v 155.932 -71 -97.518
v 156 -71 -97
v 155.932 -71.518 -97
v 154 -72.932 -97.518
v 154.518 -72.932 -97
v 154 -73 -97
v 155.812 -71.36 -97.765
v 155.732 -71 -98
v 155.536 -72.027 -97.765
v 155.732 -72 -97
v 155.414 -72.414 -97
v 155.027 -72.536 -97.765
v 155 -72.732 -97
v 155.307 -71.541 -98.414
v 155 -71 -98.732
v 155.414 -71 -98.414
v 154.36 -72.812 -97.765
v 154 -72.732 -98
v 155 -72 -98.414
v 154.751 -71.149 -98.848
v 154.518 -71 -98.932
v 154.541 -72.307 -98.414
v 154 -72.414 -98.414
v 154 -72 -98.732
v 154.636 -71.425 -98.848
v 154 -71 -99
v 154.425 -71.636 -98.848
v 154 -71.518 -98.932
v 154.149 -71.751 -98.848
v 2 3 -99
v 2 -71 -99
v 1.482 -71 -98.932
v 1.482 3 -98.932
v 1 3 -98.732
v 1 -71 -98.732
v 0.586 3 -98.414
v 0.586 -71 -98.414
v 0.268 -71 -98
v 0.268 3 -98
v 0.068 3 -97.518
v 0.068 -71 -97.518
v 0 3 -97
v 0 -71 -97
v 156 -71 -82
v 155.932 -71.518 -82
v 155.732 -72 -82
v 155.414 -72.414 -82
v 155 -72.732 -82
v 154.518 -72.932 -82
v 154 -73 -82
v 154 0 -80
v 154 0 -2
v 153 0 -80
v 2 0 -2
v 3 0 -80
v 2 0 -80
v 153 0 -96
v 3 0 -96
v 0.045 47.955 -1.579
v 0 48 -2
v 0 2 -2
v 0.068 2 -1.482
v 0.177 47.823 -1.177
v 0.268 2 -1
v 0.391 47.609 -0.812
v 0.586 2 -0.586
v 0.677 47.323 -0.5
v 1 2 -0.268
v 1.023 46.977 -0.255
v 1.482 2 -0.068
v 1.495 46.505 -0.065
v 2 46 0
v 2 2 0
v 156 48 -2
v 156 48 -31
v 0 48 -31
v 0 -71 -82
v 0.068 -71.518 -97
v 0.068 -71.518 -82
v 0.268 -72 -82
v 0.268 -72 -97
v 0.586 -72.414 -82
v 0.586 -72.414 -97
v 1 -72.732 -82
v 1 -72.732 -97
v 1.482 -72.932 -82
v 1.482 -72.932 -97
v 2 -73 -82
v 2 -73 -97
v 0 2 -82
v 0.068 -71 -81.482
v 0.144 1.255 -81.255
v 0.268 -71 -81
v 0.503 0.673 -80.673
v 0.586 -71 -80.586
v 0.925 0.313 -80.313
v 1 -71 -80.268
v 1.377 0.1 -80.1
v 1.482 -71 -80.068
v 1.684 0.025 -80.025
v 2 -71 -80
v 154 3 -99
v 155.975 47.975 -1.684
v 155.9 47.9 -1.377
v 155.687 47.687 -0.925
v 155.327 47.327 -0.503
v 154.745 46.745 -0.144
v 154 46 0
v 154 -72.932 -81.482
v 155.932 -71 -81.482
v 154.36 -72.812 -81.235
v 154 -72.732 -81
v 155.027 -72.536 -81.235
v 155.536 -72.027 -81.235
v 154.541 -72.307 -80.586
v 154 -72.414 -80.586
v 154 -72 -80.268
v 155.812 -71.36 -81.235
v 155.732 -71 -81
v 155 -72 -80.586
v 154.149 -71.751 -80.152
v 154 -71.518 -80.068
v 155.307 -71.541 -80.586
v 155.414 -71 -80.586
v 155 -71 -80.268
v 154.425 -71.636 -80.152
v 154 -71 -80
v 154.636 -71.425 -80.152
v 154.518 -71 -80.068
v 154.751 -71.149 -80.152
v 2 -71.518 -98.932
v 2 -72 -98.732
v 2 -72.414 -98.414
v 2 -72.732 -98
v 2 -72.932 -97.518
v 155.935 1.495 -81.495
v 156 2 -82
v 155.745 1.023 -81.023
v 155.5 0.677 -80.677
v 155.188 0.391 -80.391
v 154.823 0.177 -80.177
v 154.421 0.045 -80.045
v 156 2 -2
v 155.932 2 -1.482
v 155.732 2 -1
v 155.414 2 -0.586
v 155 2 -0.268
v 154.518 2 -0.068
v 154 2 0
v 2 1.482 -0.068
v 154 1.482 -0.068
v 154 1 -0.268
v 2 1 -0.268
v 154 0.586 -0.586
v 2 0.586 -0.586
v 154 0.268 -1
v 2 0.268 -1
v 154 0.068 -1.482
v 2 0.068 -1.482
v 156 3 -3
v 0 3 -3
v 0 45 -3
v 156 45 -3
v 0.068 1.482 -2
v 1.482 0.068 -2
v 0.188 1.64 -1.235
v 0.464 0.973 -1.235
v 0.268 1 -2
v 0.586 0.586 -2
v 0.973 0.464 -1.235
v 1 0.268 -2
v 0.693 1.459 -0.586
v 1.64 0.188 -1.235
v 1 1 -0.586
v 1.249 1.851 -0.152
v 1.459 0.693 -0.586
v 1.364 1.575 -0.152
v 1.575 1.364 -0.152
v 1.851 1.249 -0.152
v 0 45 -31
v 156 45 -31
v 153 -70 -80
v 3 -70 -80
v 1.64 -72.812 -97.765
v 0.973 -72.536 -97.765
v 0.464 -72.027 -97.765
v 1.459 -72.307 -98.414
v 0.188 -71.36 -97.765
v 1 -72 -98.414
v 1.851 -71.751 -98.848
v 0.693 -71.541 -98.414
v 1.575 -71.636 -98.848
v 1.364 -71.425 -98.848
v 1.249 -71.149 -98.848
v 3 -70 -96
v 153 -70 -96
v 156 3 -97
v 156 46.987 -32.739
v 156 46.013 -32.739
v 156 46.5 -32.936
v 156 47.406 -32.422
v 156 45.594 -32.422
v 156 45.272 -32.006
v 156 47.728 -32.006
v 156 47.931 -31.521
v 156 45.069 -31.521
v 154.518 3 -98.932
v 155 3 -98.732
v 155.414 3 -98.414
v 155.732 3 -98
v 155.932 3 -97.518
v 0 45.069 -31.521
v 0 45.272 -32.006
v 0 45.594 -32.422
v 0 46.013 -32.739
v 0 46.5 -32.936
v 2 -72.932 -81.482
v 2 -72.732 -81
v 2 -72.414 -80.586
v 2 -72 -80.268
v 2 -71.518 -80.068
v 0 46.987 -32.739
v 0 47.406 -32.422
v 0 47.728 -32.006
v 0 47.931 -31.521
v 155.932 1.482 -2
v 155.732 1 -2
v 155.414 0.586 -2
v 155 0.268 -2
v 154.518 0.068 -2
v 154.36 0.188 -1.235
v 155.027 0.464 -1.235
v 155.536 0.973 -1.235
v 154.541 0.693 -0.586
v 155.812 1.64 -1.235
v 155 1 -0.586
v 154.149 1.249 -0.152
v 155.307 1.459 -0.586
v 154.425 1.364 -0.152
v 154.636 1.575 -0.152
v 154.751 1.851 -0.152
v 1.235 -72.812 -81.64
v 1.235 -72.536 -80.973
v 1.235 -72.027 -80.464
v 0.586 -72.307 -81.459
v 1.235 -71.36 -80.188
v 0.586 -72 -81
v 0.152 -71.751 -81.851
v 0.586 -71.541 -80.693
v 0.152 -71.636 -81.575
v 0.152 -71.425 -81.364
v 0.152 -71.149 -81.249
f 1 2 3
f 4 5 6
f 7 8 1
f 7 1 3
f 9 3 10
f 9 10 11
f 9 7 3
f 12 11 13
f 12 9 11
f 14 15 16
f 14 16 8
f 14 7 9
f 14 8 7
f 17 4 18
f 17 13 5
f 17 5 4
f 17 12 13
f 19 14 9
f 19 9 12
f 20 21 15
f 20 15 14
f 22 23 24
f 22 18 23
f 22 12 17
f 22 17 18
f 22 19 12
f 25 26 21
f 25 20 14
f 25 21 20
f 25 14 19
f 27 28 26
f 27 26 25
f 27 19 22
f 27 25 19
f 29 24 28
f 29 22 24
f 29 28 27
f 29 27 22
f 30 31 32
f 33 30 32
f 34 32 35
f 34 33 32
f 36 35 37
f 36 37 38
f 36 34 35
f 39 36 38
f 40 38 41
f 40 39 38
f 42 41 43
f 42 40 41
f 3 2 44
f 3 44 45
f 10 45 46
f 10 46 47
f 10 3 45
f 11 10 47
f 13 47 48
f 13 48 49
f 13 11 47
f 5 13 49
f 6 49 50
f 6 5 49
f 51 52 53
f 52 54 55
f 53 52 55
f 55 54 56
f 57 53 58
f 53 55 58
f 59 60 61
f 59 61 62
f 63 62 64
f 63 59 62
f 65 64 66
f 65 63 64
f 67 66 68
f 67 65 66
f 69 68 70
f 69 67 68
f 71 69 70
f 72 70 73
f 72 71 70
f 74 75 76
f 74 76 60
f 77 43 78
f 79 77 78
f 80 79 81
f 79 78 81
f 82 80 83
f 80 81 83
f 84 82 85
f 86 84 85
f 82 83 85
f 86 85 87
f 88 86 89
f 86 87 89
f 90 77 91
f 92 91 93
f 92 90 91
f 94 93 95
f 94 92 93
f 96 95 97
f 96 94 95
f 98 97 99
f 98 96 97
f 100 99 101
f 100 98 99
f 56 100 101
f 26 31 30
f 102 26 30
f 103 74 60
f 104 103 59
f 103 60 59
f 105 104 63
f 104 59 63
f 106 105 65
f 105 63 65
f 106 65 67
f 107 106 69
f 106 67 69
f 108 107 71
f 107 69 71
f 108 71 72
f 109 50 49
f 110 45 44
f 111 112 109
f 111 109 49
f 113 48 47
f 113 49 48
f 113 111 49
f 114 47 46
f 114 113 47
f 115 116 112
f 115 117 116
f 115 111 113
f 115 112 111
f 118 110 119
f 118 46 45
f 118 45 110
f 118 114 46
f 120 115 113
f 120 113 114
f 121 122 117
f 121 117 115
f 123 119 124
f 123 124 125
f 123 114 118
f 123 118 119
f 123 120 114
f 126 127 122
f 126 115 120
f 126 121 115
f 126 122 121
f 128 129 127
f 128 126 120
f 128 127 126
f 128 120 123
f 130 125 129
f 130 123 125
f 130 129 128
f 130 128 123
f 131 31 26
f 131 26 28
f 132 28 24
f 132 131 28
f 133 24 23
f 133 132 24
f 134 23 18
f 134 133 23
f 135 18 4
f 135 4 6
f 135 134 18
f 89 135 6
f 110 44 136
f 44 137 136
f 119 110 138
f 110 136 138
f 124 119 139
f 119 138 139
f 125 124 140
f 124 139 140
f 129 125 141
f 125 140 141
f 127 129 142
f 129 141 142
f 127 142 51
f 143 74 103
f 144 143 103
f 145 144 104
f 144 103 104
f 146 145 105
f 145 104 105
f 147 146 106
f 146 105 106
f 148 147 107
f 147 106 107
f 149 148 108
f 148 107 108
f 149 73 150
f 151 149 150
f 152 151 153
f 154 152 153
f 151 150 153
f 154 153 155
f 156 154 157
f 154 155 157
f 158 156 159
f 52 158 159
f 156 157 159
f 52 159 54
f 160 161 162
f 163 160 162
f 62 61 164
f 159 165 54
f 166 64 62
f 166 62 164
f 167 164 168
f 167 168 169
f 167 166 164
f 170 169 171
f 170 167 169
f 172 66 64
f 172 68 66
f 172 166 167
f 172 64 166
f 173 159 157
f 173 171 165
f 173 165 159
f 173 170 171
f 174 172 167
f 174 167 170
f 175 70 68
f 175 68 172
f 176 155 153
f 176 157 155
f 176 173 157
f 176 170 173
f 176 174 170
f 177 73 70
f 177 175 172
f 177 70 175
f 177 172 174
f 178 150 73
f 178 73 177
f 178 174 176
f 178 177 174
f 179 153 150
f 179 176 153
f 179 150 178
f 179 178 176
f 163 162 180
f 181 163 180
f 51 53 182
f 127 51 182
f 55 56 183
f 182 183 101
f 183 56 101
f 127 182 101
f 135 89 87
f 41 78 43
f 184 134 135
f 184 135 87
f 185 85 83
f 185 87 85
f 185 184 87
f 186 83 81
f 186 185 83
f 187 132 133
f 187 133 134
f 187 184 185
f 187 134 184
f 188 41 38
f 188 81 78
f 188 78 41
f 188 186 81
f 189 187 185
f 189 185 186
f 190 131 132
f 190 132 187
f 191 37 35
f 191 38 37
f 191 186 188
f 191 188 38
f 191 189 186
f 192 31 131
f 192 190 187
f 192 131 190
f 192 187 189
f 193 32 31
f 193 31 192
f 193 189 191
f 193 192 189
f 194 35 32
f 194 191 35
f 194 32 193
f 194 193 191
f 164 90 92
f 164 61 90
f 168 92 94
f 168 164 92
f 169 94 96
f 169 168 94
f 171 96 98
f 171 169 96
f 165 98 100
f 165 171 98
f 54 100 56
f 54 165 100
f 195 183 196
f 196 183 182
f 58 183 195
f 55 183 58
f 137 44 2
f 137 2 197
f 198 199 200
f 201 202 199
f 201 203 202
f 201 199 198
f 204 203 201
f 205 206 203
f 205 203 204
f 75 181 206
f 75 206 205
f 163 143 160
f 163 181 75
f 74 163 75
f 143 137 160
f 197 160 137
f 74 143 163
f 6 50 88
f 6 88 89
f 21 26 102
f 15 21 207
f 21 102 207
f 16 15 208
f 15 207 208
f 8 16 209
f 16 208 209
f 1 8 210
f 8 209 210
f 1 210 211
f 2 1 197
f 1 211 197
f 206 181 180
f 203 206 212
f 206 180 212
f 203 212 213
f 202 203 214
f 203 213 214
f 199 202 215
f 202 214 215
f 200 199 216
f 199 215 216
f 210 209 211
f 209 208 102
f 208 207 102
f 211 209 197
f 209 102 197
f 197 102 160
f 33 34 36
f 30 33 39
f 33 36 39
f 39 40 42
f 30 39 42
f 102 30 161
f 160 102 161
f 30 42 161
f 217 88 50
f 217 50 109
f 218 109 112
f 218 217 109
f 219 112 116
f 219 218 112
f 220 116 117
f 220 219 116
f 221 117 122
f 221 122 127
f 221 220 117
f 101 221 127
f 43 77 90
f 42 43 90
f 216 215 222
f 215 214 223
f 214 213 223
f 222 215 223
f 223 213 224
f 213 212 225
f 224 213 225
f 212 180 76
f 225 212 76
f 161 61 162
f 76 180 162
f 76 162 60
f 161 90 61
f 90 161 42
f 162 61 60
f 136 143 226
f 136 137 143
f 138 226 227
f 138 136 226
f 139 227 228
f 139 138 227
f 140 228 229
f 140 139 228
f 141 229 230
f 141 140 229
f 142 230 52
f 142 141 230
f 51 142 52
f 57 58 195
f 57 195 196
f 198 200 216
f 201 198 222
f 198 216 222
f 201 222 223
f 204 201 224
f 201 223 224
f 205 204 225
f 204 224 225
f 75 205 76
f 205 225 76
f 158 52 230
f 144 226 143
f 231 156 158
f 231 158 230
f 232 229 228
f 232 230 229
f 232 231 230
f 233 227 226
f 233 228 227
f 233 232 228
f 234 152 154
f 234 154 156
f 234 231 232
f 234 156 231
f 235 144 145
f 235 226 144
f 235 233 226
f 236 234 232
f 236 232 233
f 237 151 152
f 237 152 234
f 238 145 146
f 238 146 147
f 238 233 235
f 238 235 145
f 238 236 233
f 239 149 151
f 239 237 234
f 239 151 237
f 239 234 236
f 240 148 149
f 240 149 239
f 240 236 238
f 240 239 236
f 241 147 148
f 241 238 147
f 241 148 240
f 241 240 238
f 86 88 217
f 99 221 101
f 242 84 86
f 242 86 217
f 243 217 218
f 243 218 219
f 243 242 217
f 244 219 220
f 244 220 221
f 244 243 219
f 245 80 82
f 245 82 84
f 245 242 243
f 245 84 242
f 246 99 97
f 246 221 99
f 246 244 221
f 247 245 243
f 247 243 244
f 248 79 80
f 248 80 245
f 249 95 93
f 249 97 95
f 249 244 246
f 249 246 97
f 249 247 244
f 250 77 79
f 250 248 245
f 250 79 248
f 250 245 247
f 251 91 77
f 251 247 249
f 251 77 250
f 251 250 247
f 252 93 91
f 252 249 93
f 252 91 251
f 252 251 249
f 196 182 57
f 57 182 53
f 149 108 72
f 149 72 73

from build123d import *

# Parameters (mm, degrees)
F1_DEPTH     = 156
F2_W         = 150
F2_H         = 70
F3_DEPTH     = 16
F4_T1_DEPTH  = 152
F4_T3_DEPTH  = 51
F4_T5_DEPTH  = 166
F4_T7_DEPTH  = 78
F4_T9_DEPTH  = 71
F4_T11_DEPTH = 79
F4_T13_DEPTH = 15
F4_S17_W     = 2
F4_S17_H     = 2
F4_T18_DEPTH = 2
F4_S23_W     = 2
F4_S23_H     = 2
F4_T24_DEPTH = 2
F4_S29_W     = 2
F4_S29_H     = 2
F4_T30_DEPTH = 2
F4_S35_W     = 2
F4_S35_H     = 2
F4_T36_DEPTH = 2
F4_S41_W     = 2
F4_S41_H     = 2
F4_T42_DEPTH = 2
F4_S47_W     = 2
F4_S47_H     = 2
F4_T48_DEPTH = 2
F4_T55_DEPTH = 83
F4_T59_DEPTH = 76
F4_T66_DEPTH = 83
F4_T70_DEPTH = 76


# Not quite as in the source:
# - a fillet or chamfer that OpenCascade refuses, or shapes differently, is made with other operations: its cross-section is extruded or revolved along the edge and cut away or added


with BuildPart() as f1:
    # F0 (on Right) → F1 (new body)
    with BuildSketch(Plane.YZ):
        Polygon((3, -99), (3, -3), (0, -3), (0, -80), (-73, -80), (-73, -99), align=None)
        Polygon((0, -3), (3, -3), (45, -3), (45, 0), (0, 0), align=None)
        Polygon((45, 0), (45, -3), (45, -33), (48, -33), (48, 0), align=None)
    extrude(amount=F1_DEPTH)

    # F2 (on face) → F3 (cut)
    with BuildSketch(Plane.XY.offset(-80)):
        with Locations((78, -35)):
            Rectangle(F2_W, F2_H)
    extrude(amount=-F3_DEPTH, mode=Mode.SUBTRACT)

    # F4: fillet of radius 2 on 16 edges, made by hand

    # F4_s2 → F4_t1 (cut)
    with BuildSketch(Plane.YZ.offset(2)):
        with BuildLine():
            ThreePointArc((2, 0), (0.5857864376, -0.5857864376), (0, -2))
            Line((0, -2), (0, 0))
            Line((0, 0), (2, 0))
        make_face()
        with BuildLine():
            ThreePointArc((-73, -82), (-72.4142135624, -80.5857864376), (-71, -80))
            Line((-71, -80), (-73, -80))
            Line((-73, -80), (-73, -82))
        make_face()
        with BuildLine():
            ThreePointArc((-71, -99), (-72.4142135624, -98.4142135624), (-73, -97))
            Line((-73, -97), (-73, -99))
            Line((-73, -99), (-71, -99))
        make_face()
    extrude(amount=F4_T1_DEPTH, mode=Mode.SUBTRACT)

    # F4_s4 → F4_t3 (cut)
    with BuildSketch(Plane.XZ.offset(-53)):
        with BuildLine():
            ThreePointArc((156, -2), (155.4142135624, -0.5857864376), (154, 0))
            Line((154, 0), (156, 0))
            Line((156, 0), (156, -2))
        make_face()
        with BuildLine():
            ThreePointArc((0, -2), (0.5857864376, -0.5857864376), (2, 0))
            Line((2, 0), (0, 0))
            Line((0, 0), (0, -2))
        make_face()
    extrude(amount=F4_T3_DEPTH, mode=Mode.SUBTRACT)

    # F4_s6 → F4_t5 (cut)
    with BuildSketch(Plane.YZ.offset(-5)):
        with BuildLine():
            ThreePointArc((48, -2), (47.4142135624, -0.5857864376), (46, 0))
            Line((46, 0), (48, 0))
            Line((48, 0), (48, -2))
        make_face()
        with BuildLine():
            ThreePointArc((46, -33), (47.4142135624, -32.4142135624), (48, -31))
            Line((48, -31), (48, -33))
            Line((48, -33), (46, -33))
        make_face()
        with BuildLine():
            ThreePointArc((45, -31), (45.5857864376, -32.4142135624), (47, -33))
            Line((47, -33), (45, -33))
            Line((45, -33), (45, -31))
        make_face()
    extrude(amount=F4_T5_DEPTH, mode=Mode.SUBTRACT)

    # F4_s8 → F4_t7 (cut)
    with BuildSketch(Plane.XY.offset(-80)):
        with BuildLine():
            ThreePointArc((156, 2), (155.4142135624, 0.5857864376), (154, 0))
            Line((154, 0), (156, 0))
            Line((156, 0), (156, 2))
        make_face()
        with BuildLine():
            ThreePointArc((0, 2), (0.5857864376, 0.5857864376), (2, 0))
            Line((2, 0), (0, 0))
            Line((0, 0), (0, 2))
        make_face()
    extrude(amount=F4_T7_DEPTH, mode=Mode.SUBTRACT)

    # F4_s10 → F4_t9 (cut)
    with BuildSketch(Plane.XZ):
        with BuildLine():
            ThreePointArc((156, -82), (155.4142135624, -80.5857864376), (154, -80))
            Line((154, -80), (156, -80))
            Line((156, -80), (156, -82))
        make_face()
        with BuildLine():
            ThreePointArc((0, -82), (0.5857864376, -80.5857864376), (2, -80))
            Line((2, -80), (0, -80))
            Line((0, -80), (0, -82))
        make_face()
    extrude(amount=F4_T9_DEPTH, mode=Mode.SUBTRACT)

    # F4_s12 → F4_t11 (cut)
    with BuildSketch(Plane.XZ.offset(-8)):
        with BuildLine():
            ThreePointArc((154, -99), (155.4142135624, -98.4142135624), (156, -97))
            Line((156, -97), (156, -99))
            Line((156, -99), (154, -99))
        make_face()
        with BuildLine():
            ThreePointArc((2, -99), (0.5857864376, -98.4142135624), (0, -97))
            Line((0, -97), (0, -99))
            Line((0, -99), (2, -99))
        make_face()
    extrude(amount=F4_T11_DEPTH, mode=Mode.SUBTRACT)

    # F4_s14 → F4_t13 (cut)
    with BuildSketch(Plane.XY.offset(-97)):
        with BuildLine():
            ThreePointArc((0, -71), (0.5857864376, -72.4142135624), (2, -73))
            Line((2, -73), (0, -73))
            Line((0, -73), (0, -71))
        make_face()
        with BuildLine():
            ThreePointArc((156, -71), (155.4142135624, -72.4142135624), (154, -73))
            Line((154, -73), (156, -73))
            Line((156, -73), (156, -71))
        make_face()
    extrude(amount=F4_T13_DEPTH, mode=Mode.SUBTRACT)


with BuildPart() as f4_tool16:
    # F4_s17 → F4_t18 (new body)
    with BuildSketch(Plane.XY.offset(-2)):
        with Locations((1, 1)):
            Rectangle(F4_S17_W, F4_S17_H)
    extrude(amount=F4_T18_DEPTH)

    # F4_s19 → F4_t20 (revolve, cut)
    with BuildSketch(Plane(origin=(2, 2, -2), x_dir=(0.7071067812, 0.7071067812, 0), z_dir=(0.7071067812, -0.7071067812, 0))):
        with BuildLine():
            ThreePointArc((0, -2), (2, 0), (0, 2))
            Line((0, 2), (0, -2))
        make_face()
    revolve(axis=Axis((2, 2, -2), (0, 0, 1)), mode=Mode.SUBTRACT)


with BuildPart() as f1_1:
    add(f1.part)

    # F4_t15: cut F4_tool16
    add(f4_tool16.part, mode=Mode.SUBTRACT)


with BuildPart() as f4_tool22:
    # F4_s23 → F4_t24 (new body)
    with BuildSketch(Plane.XY.offset(-2)):
        with Locations((155, 1)):
            Rectangle(F4_S23_W, F4_S23_H)
    extrude(amount=F4_T24_DEPTH)

    # F4_s25 → F4_t26 (revolve, cut)
    with BuildSketch(Plane(origin=(154, 2, -2), x_dir=(-0.7071067812, 0.7071067812, 0), z_dir=(0.7071067812, 0.7071067812, 0))):
        with BuildLine():
            ThreePointArc((0, -2), (2, 0), (0, 2))
            Line((0, 2), (0, -2))
        make_face()
    revolve(axis=Axis((154, 2, -2), (0, 0, 1)), mode=Mode.SUBTRACT)


with BuildPart() as f1_2:
    add(f1_1.part)

    # F4_t21: cut F4_tool22
    add(f4_tool22.part, mode=Mode.SUBTRACT)


with BuildPart() as f4_tool28:
    # F4_s29 → F4_t30 (new body)
    with BuildSketch(Plane.XY.offset(-82)):
        with Locations((155, -72)):
            Rectangle(F4_S29_W, F4_S29_H)
    extrude(amount=F4_T30_DEPTH)

    # F4_s31 → F4_t32 (revolve, cut)
    with BuildSketch(Plane(origin=(154, -71, -82), x_dir=(-0.7071067812, 0.7071067812, 0), z_dir=(0.7071067812, 0.7071067812, 0))):
        with BuildLine():
            ThreePointArc((0, -2), (2, 0), (0, 2))
            Line((0, 2), (0, -2))
        make_face()
    revolve(axis=Axis((154, -71, -82), (0, 0, 1)), mode=Mode.SUBTRACT)


with BuildPart() as f1_3:
    add(f1_2.part)

    # F4_t27: cut F4_tool28
    add(f4_tool28.part, mode=Mode.SUBTRACT)


with BuildPart() as f4_tool34:
    # F4_s35 → F4_t36 (new body)
    with BuildSketch(Plane.YZ.offset(2)):
        with Locations((-72, -81)):
            Rectangle(F4_S35_W, F4_S35_H)
    extrude(amount=-F4_T36_DEPTH)

    # F4_s37 → F4_t38 (revolve, cut)
    with BuildSketch(Plane(origin=(2, -71, -82), x_dir=(0, 0.7071067812, -0.7071067812), z_dir=(0, 0.7071067812, 0.7071067812))):
        with BuildLine():
            ThreePointArc((0, -2), (2, 0), (0, 2))
            Line((0, 2), (0, -2))
        make_face()
    revolve(axis=Axis((2, -71, -82), (-1, 0, 0)), mode=Mode.SUBTRACT)


with BuildPart() as f1_4:
    add(f1_3.part)

    # F4_t33: cut F4_tool34
    add(f4_tool34.part, mode=Mode.SUBTRACT)


with BuildPart() as f4_tool40:
    # F4_s41 → F4_t42 (new body)
    with BuildSketch(Plane.XY.offset(-97)):
        with Locations((1, -72)):
            Rectangle(F4_S41_W, F4_S41_H)
    extrude(amount=-F4_T42_DEPTH)

    # F4_s43 → F4_t44 (revolve, cut)
    with BuildSketch(Plane(origin=(2, -71, -97), x_dir=(0.7071067812, 0.7071067812, 0), z_dir=(-0.7071067812, 0.7071067812, 0))):
        with BuildLine():
            ThreePointArc((0, -2), (2, 0), (0, 2))
            Line((0, 2), (0, -2))
        make_face()
    revolve(axis=Axis((2, -71, -97), (0, 0, -1)), mode=Mode.SUBTRACT)


with BuildPart() as f1_5:
    add(f1_4.part)

    # F4_t39: cut F4_tool40
    add(f4_tool40.part, mode=Mode.SUBTRACT)


with BuildPart() as f4_tool46:
    # F4_s47 → F4_t48 (new body)
    with BuildSketch(Plane.XY.offset(-97)):
        with Locations((155, -72)):
            Rectangle(F4_S47_W, F4_S47_H)
    extrude(amount=-F4_T48_DEPTH)

    # F4_s49 → F4_t50 (revolve, cut)
    with BuildSketch(Plane(origin=(154, -71, -97), x_dir=(-0.7071067812, 0.7071067812, 0), z_dir=(-0.7071067812, -0.7071067812, 0))):
        with BuildLine():
            ThreePointArc((0, -2), (2, 0), (0, 2))
            Line((0, 2), (0, -2))
        make_face()
    revolve(axis=Axis((154, -71, -97), (0, 0, -1)), mode=Mode.SUBTRACT)


with BuildPart() as f1_6:
    add(f1_5.part)

    # F4_t45: cut F4_tool46
    add(f4_tool46.part, mode=Mode.SUBTRACT)


with BuildPart() as f4_tool53:
    # F4_s54 → F4_t55 (new body)
    with BuildSketch(Plane.XY.offset(-2)):
        with BuildLine():
            ThreePointArc((156, 2), (155.4142135624, 0.5857864376), (154, 0))
            Line((154, 0), (156, 0))
            Line((156, 0), (156, 2))
        make_face()
    extrude(amount=-F4_T55_DEPTH)

    split(bisect_by=Plane.XY.offset(-80), keep=Keep.BOTTOM)


with BuildPart() as f4_tool57:
    # F4_s58 → F4_t59 (new body)
    with BuildSketch(Plane.XZ.offset(-5)):
        with BuildLine():
            ThreePointArc((156, -82), (155.4142135624, -80.5857864376), (154, -80))
            Line((154, -80), (156, -80))
            Line((156, -80), (156, -82))
        make_face()
    extrude(amount=F4_T59_DEPTH)

    split(bisect_by=Plane.XZ, keep=Keep.BOTTOM)


with BuildPart() as f4_tool53_1:
    add(f4_tool53.part)

    # F4_t61: intersect F4_tool57
    add(f4_tool57.part, mode=Mode.INTERSECT)


with BuildPart() as f1_7:
    add(f1_6.part)

    # F4_t51: cut F4_tool53
    add(f4_tool53_1.part, mode=Mode.SUBTRACT)


with BuildPart() as f4_tool64:
    # F4_s65 → F4_t66 (new body)
    with BuildSketch(Plane.XY.offset(-2)):
        with BuildLine():
            ThreePointArc((0, 2), (0.5857864376, 0.5857864376), (2, 0))
            Line((2, 0), (0, 0))
            Line((0, 0), (0, 2))
        make_face()
    extrude(amount=-F4_T66_DEPTH)

    split(bisect_by=Plane.XY.offset(-80), keep=Keep.BOTTOM)


with BuildPart() as f4_tool68:
    # F4_s69 → F4_t70 (new body)
    with BuildSketch(Plane.XZ.offset(-5)):
        with BuildLine():
            ThreePointArc((0, -82), (0.5857864376, -80.5857864376), (2, -80))
            Line((2, -80), (0, -80))
            Line((0, -80), (0, -82))
        make_face()
    extrude(amount=F4_T70_DEPTH)

    split(bisect_by=Plane.XZ, keep=Keep.BOTTOM)


with BuildPart() as f4_tool64_1:
    add(f4_tool64.part)

    # F4_t72: intersect F4_tool68
    add(f4_tool68.part, mode=Mode.INTERSECT)


with BuildPart() as f1_8:
    add(f1_7.part)

    # F4_t62: cut F4_tool64
    add(f4_tool64_1.part, mode=Mode.SUBTRACT)


solid = f1_8.part
